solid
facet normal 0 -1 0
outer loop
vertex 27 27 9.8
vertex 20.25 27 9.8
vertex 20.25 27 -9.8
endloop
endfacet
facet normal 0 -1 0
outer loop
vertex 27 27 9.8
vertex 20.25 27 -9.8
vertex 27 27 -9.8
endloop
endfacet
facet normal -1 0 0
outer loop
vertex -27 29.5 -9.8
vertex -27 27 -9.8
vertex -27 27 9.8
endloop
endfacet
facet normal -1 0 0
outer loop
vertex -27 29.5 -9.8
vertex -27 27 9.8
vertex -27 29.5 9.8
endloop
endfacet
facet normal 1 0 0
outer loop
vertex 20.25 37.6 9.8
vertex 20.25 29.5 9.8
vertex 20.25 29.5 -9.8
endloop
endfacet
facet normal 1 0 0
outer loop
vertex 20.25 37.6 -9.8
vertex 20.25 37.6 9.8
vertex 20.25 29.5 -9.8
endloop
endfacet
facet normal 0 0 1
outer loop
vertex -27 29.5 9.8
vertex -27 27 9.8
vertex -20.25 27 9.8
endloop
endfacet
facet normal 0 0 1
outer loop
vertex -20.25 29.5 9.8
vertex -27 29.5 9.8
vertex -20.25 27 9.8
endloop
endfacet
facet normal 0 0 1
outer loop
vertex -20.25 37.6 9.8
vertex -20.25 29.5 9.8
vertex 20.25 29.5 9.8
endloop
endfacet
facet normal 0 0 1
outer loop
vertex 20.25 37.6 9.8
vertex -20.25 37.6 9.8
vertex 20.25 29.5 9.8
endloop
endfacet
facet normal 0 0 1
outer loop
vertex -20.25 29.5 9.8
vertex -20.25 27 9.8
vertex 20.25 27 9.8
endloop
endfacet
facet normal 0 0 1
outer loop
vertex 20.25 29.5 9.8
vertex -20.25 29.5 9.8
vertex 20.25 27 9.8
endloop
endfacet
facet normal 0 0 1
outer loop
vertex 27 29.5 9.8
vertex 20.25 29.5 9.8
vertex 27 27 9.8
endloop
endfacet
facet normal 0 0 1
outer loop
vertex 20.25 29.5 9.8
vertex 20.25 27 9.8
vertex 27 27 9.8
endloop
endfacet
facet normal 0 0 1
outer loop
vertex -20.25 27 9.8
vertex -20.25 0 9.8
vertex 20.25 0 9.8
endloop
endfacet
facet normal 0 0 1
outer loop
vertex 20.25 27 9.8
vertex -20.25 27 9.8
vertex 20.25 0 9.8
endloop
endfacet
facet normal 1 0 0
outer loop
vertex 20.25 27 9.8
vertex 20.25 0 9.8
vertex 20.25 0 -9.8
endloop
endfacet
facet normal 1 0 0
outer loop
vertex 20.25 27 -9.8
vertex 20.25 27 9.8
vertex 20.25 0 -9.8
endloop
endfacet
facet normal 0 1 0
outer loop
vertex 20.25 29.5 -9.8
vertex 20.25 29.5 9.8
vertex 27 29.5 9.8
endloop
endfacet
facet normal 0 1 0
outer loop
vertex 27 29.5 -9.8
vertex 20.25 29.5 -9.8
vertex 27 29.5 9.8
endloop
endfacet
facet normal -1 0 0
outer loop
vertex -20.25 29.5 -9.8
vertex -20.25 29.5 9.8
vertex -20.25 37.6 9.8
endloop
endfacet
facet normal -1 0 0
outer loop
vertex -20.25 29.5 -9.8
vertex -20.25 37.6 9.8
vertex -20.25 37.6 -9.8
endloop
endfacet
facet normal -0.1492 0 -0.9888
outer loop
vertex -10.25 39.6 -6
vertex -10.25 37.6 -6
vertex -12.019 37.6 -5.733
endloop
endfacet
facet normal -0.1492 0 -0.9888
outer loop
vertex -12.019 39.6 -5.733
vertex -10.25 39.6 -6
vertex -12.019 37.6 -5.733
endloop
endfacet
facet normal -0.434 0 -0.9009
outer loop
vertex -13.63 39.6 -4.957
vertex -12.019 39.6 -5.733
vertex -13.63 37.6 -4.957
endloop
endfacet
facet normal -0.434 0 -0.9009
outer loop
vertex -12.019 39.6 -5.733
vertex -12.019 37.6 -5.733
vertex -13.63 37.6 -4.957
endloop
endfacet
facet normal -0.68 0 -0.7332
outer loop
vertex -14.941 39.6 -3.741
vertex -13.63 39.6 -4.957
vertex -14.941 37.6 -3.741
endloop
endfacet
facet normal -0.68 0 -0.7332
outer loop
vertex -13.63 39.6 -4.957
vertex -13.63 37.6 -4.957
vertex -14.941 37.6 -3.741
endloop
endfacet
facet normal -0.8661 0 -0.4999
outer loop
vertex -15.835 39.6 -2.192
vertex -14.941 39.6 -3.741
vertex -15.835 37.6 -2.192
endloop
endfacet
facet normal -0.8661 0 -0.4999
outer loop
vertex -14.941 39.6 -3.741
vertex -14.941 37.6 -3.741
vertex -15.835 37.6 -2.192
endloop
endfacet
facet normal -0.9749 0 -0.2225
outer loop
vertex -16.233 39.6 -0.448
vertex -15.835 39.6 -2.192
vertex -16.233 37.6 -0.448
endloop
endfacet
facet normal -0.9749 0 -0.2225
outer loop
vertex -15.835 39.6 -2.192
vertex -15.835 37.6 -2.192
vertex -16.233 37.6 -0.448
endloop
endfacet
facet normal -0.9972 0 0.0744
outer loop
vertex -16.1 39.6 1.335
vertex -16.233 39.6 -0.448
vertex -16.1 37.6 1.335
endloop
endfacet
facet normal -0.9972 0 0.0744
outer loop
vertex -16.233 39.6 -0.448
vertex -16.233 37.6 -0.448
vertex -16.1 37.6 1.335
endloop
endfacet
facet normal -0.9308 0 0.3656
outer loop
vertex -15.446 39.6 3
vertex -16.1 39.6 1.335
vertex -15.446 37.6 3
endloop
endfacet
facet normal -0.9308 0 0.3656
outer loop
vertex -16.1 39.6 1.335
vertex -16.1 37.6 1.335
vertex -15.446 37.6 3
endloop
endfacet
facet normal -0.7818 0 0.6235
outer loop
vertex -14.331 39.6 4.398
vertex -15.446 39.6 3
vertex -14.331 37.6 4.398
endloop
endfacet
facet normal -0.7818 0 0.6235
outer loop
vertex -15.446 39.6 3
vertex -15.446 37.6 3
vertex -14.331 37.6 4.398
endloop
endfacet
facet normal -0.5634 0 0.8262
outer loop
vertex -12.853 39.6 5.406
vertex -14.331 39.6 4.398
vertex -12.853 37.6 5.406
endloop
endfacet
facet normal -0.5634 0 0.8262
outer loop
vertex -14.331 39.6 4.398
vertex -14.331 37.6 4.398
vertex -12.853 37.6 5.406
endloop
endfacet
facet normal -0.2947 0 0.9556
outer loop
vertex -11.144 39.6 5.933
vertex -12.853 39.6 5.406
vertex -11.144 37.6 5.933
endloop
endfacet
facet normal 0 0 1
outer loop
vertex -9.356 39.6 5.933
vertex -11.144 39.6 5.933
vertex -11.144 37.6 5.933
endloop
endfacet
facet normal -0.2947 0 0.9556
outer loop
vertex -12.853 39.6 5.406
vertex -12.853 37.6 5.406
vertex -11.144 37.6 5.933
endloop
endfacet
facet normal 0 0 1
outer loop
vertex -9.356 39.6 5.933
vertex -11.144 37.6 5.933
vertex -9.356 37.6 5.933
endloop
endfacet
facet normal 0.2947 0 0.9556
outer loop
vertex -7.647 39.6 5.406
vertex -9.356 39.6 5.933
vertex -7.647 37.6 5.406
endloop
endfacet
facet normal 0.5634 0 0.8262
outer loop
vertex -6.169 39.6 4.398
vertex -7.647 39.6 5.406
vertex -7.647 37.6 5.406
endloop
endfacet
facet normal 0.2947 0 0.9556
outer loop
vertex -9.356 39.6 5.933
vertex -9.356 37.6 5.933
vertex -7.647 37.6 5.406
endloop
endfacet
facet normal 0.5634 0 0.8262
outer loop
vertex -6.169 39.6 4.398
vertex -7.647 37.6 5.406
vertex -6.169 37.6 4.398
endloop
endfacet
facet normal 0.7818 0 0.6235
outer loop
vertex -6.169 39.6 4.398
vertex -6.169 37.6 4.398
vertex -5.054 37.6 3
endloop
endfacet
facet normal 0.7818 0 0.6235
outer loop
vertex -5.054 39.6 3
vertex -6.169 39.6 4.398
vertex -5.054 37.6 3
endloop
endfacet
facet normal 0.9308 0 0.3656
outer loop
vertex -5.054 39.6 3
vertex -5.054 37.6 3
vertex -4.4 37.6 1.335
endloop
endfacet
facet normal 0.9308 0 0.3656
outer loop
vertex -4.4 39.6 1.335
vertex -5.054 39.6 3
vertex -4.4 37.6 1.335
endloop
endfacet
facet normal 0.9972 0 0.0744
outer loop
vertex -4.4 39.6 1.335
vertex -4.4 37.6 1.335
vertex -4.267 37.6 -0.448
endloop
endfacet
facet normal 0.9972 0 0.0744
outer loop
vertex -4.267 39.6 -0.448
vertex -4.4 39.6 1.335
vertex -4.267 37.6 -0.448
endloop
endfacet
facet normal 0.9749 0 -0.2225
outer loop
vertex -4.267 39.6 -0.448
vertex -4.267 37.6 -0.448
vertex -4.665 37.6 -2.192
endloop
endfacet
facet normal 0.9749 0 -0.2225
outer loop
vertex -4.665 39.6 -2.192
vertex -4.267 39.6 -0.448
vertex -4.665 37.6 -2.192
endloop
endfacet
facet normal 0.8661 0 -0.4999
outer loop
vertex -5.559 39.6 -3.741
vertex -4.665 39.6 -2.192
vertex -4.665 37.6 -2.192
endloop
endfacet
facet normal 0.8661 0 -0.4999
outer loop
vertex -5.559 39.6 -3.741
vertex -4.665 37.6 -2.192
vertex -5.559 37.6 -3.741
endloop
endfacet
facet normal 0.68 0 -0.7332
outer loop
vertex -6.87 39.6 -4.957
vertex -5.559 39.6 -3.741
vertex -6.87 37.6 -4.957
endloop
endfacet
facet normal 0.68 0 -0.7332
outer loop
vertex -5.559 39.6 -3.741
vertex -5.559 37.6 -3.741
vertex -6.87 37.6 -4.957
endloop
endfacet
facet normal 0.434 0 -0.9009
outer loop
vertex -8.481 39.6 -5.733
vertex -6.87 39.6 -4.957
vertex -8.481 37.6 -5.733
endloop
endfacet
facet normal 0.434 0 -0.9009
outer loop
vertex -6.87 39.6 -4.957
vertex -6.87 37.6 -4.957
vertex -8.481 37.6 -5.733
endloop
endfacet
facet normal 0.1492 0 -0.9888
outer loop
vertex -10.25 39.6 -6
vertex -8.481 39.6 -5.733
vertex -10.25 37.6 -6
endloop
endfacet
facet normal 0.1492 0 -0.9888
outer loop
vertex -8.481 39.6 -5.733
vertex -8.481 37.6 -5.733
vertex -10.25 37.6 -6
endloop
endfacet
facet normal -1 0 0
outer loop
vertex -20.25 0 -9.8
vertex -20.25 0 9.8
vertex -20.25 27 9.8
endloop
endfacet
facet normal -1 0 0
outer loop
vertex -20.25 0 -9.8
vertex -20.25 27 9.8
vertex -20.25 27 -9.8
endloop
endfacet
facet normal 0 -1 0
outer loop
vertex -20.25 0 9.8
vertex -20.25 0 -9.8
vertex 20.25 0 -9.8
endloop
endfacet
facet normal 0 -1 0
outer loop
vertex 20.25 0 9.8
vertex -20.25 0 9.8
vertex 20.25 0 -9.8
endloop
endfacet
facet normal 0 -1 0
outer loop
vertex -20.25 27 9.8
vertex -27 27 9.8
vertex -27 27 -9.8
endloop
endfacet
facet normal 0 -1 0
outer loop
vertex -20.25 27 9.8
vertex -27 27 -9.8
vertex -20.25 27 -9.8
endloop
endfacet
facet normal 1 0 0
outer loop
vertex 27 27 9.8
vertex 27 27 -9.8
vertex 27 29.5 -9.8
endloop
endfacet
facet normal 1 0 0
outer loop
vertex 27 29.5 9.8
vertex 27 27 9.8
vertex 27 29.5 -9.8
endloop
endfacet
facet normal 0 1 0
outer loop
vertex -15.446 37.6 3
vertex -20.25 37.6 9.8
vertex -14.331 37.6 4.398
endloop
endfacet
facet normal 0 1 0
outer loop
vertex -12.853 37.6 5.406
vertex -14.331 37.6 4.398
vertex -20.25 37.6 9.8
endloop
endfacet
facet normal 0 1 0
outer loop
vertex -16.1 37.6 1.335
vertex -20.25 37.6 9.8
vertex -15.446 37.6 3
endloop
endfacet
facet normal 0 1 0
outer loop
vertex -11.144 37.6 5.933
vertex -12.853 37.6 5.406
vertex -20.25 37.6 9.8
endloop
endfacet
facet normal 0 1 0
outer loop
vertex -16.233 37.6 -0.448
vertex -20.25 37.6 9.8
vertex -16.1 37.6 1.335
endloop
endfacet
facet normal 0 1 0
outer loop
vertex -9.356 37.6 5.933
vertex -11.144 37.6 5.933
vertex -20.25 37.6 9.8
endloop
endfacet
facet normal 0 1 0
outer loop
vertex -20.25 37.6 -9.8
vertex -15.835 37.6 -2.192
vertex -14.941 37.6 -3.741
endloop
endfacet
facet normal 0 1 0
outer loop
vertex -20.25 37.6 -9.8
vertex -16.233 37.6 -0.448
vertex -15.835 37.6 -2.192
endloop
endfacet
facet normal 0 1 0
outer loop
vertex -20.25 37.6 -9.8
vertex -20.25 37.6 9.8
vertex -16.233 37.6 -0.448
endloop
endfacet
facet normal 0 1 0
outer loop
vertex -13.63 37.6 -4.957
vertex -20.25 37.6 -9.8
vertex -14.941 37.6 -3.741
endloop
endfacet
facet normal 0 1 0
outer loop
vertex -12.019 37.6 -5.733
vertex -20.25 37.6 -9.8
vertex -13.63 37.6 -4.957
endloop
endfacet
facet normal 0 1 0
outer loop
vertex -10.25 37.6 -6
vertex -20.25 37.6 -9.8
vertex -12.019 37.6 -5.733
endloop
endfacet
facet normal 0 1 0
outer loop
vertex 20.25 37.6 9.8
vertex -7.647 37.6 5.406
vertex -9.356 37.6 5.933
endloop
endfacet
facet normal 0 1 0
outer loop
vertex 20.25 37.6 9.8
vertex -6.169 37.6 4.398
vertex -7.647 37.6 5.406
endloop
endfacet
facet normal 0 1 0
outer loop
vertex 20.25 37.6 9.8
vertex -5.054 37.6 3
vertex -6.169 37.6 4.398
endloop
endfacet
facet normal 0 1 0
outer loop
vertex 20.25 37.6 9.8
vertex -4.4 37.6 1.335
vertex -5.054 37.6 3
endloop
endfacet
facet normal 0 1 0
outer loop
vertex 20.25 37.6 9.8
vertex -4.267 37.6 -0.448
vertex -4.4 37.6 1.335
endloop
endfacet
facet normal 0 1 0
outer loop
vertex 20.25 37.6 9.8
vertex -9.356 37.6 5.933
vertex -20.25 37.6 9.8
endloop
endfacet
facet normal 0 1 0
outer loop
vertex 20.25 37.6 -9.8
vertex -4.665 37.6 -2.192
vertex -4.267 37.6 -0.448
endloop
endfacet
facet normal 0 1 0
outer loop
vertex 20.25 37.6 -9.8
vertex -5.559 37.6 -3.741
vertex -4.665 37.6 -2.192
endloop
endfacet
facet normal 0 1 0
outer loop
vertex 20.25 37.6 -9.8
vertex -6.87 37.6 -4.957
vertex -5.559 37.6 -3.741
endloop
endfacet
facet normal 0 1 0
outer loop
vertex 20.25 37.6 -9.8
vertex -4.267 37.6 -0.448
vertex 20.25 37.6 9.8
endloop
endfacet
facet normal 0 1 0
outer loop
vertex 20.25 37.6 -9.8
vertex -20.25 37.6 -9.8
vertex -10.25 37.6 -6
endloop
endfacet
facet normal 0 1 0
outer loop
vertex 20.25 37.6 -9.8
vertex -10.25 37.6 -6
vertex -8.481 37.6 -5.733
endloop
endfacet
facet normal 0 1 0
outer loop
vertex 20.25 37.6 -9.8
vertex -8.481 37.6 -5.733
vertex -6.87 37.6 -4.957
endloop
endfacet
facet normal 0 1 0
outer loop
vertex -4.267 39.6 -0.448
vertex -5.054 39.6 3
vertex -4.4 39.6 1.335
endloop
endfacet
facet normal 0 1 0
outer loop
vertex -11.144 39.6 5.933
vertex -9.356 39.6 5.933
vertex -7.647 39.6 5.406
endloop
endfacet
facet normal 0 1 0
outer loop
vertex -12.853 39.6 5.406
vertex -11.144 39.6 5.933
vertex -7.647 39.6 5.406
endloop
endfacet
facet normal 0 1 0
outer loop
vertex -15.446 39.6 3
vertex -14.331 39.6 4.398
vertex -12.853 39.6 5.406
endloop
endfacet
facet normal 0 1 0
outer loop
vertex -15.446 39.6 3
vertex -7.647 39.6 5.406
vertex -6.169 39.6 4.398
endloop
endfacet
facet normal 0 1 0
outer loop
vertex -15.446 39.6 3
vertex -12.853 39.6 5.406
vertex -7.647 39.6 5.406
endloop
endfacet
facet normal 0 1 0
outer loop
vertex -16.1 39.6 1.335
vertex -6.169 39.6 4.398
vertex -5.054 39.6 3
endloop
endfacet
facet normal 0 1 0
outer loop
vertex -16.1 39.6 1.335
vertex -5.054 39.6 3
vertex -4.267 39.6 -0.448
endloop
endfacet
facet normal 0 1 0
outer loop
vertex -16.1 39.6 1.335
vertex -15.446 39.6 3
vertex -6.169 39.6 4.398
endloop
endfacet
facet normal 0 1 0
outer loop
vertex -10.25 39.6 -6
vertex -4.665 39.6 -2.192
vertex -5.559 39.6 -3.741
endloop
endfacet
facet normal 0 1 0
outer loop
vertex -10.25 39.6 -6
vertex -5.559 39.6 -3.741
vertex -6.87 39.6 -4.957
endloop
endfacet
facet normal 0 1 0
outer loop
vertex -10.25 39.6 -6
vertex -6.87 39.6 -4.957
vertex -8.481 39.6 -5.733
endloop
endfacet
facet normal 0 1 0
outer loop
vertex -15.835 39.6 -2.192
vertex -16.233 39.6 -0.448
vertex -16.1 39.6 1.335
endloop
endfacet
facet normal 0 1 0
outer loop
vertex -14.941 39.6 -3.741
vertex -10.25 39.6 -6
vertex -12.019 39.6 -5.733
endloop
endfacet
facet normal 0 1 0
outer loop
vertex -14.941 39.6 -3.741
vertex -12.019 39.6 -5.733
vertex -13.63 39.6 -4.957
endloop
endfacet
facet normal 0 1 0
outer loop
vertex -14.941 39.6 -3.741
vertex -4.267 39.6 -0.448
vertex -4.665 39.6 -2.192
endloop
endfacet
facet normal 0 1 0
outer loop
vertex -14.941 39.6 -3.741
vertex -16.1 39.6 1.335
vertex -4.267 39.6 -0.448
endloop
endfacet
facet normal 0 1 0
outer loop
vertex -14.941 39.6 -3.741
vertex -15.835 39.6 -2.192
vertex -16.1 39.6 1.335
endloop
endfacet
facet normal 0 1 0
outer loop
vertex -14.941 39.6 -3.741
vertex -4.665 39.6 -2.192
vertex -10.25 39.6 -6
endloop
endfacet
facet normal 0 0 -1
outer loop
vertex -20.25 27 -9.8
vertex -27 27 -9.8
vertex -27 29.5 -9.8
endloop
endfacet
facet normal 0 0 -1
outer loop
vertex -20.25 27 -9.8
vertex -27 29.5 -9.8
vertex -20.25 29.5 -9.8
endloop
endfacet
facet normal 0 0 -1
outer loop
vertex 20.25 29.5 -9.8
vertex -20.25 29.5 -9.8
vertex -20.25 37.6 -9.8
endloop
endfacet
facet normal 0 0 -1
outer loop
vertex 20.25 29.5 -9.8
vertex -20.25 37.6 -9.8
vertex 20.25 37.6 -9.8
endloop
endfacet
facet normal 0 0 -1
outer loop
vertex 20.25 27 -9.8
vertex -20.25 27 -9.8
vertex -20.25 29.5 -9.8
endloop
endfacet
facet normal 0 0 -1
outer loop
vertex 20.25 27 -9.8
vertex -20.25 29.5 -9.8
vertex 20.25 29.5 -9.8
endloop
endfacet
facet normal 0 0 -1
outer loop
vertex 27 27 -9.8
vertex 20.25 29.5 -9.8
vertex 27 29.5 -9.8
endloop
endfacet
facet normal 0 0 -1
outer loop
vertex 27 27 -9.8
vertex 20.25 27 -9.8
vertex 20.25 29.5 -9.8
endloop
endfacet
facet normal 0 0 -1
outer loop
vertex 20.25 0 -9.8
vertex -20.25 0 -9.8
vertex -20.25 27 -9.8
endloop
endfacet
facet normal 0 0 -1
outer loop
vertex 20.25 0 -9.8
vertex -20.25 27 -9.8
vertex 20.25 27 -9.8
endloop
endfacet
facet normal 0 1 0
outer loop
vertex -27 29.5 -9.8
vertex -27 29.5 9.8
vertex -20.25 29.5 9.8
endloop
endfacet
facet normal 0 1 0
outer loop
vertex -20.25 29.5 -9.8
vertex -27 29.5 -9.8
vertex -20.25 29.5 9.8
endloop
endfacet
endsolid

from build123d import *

# Parameters (mm, degrees)
SKETCH1_W           = 40.5
SKETCH1_H           = 19.6
BOSS_EXTRUDE1_DEPTH = 37.6
SKETCH2_R           = 6
BOSS_EXTRUDE2_DEPTH = 2
SKETCH3_W           = 6.75
SKETCH3_H           = 2.5
BOSS_EXTRUDE3_DEPTH = 19.6


with BuildPart() as part:
    # Sketch1 → Boss-Extrude1 (new body)
    with BuildSketch(Plane(origin=(0, 0, 0), x_dir=(1, 0, 0), z_dir=(0, 1, 0))):
        Rectangle(SKETCH1_W, SKETCH1_H)
    extrude(amount=BOSS_EXTRUDE1_DEPTH)

    # Sketch2 → Boss-Extrude2 (add)
    with BuildSketch(Plane(origin=(0, 37.6, 0), x_dir=(1, 0, 0), z_dir=(0, 1, 0))):
        with Locations(Location((-10.25, 0, 0), (0, 0, 90))):
            Circle(SKETCH2_R)
    extrude(amount=BOSS_EXTRUDE2_DEPTH)

    # Sketch3 → Boss-Extrude3 (add)
    with BuildSketch(Plane.XY.offset(9.8)):
        with Locations((-23.625, 28.25)):
            Rectangle(SKETCH3_W, SKETCH3_H)
        with Locations((23.625, 28.25)):
            Rectangle(SKETCH3_W, SKETCH3_H)
    extrude(amount=-BOSS_EXTRUDE3_DEPTH)


solid = part.part
